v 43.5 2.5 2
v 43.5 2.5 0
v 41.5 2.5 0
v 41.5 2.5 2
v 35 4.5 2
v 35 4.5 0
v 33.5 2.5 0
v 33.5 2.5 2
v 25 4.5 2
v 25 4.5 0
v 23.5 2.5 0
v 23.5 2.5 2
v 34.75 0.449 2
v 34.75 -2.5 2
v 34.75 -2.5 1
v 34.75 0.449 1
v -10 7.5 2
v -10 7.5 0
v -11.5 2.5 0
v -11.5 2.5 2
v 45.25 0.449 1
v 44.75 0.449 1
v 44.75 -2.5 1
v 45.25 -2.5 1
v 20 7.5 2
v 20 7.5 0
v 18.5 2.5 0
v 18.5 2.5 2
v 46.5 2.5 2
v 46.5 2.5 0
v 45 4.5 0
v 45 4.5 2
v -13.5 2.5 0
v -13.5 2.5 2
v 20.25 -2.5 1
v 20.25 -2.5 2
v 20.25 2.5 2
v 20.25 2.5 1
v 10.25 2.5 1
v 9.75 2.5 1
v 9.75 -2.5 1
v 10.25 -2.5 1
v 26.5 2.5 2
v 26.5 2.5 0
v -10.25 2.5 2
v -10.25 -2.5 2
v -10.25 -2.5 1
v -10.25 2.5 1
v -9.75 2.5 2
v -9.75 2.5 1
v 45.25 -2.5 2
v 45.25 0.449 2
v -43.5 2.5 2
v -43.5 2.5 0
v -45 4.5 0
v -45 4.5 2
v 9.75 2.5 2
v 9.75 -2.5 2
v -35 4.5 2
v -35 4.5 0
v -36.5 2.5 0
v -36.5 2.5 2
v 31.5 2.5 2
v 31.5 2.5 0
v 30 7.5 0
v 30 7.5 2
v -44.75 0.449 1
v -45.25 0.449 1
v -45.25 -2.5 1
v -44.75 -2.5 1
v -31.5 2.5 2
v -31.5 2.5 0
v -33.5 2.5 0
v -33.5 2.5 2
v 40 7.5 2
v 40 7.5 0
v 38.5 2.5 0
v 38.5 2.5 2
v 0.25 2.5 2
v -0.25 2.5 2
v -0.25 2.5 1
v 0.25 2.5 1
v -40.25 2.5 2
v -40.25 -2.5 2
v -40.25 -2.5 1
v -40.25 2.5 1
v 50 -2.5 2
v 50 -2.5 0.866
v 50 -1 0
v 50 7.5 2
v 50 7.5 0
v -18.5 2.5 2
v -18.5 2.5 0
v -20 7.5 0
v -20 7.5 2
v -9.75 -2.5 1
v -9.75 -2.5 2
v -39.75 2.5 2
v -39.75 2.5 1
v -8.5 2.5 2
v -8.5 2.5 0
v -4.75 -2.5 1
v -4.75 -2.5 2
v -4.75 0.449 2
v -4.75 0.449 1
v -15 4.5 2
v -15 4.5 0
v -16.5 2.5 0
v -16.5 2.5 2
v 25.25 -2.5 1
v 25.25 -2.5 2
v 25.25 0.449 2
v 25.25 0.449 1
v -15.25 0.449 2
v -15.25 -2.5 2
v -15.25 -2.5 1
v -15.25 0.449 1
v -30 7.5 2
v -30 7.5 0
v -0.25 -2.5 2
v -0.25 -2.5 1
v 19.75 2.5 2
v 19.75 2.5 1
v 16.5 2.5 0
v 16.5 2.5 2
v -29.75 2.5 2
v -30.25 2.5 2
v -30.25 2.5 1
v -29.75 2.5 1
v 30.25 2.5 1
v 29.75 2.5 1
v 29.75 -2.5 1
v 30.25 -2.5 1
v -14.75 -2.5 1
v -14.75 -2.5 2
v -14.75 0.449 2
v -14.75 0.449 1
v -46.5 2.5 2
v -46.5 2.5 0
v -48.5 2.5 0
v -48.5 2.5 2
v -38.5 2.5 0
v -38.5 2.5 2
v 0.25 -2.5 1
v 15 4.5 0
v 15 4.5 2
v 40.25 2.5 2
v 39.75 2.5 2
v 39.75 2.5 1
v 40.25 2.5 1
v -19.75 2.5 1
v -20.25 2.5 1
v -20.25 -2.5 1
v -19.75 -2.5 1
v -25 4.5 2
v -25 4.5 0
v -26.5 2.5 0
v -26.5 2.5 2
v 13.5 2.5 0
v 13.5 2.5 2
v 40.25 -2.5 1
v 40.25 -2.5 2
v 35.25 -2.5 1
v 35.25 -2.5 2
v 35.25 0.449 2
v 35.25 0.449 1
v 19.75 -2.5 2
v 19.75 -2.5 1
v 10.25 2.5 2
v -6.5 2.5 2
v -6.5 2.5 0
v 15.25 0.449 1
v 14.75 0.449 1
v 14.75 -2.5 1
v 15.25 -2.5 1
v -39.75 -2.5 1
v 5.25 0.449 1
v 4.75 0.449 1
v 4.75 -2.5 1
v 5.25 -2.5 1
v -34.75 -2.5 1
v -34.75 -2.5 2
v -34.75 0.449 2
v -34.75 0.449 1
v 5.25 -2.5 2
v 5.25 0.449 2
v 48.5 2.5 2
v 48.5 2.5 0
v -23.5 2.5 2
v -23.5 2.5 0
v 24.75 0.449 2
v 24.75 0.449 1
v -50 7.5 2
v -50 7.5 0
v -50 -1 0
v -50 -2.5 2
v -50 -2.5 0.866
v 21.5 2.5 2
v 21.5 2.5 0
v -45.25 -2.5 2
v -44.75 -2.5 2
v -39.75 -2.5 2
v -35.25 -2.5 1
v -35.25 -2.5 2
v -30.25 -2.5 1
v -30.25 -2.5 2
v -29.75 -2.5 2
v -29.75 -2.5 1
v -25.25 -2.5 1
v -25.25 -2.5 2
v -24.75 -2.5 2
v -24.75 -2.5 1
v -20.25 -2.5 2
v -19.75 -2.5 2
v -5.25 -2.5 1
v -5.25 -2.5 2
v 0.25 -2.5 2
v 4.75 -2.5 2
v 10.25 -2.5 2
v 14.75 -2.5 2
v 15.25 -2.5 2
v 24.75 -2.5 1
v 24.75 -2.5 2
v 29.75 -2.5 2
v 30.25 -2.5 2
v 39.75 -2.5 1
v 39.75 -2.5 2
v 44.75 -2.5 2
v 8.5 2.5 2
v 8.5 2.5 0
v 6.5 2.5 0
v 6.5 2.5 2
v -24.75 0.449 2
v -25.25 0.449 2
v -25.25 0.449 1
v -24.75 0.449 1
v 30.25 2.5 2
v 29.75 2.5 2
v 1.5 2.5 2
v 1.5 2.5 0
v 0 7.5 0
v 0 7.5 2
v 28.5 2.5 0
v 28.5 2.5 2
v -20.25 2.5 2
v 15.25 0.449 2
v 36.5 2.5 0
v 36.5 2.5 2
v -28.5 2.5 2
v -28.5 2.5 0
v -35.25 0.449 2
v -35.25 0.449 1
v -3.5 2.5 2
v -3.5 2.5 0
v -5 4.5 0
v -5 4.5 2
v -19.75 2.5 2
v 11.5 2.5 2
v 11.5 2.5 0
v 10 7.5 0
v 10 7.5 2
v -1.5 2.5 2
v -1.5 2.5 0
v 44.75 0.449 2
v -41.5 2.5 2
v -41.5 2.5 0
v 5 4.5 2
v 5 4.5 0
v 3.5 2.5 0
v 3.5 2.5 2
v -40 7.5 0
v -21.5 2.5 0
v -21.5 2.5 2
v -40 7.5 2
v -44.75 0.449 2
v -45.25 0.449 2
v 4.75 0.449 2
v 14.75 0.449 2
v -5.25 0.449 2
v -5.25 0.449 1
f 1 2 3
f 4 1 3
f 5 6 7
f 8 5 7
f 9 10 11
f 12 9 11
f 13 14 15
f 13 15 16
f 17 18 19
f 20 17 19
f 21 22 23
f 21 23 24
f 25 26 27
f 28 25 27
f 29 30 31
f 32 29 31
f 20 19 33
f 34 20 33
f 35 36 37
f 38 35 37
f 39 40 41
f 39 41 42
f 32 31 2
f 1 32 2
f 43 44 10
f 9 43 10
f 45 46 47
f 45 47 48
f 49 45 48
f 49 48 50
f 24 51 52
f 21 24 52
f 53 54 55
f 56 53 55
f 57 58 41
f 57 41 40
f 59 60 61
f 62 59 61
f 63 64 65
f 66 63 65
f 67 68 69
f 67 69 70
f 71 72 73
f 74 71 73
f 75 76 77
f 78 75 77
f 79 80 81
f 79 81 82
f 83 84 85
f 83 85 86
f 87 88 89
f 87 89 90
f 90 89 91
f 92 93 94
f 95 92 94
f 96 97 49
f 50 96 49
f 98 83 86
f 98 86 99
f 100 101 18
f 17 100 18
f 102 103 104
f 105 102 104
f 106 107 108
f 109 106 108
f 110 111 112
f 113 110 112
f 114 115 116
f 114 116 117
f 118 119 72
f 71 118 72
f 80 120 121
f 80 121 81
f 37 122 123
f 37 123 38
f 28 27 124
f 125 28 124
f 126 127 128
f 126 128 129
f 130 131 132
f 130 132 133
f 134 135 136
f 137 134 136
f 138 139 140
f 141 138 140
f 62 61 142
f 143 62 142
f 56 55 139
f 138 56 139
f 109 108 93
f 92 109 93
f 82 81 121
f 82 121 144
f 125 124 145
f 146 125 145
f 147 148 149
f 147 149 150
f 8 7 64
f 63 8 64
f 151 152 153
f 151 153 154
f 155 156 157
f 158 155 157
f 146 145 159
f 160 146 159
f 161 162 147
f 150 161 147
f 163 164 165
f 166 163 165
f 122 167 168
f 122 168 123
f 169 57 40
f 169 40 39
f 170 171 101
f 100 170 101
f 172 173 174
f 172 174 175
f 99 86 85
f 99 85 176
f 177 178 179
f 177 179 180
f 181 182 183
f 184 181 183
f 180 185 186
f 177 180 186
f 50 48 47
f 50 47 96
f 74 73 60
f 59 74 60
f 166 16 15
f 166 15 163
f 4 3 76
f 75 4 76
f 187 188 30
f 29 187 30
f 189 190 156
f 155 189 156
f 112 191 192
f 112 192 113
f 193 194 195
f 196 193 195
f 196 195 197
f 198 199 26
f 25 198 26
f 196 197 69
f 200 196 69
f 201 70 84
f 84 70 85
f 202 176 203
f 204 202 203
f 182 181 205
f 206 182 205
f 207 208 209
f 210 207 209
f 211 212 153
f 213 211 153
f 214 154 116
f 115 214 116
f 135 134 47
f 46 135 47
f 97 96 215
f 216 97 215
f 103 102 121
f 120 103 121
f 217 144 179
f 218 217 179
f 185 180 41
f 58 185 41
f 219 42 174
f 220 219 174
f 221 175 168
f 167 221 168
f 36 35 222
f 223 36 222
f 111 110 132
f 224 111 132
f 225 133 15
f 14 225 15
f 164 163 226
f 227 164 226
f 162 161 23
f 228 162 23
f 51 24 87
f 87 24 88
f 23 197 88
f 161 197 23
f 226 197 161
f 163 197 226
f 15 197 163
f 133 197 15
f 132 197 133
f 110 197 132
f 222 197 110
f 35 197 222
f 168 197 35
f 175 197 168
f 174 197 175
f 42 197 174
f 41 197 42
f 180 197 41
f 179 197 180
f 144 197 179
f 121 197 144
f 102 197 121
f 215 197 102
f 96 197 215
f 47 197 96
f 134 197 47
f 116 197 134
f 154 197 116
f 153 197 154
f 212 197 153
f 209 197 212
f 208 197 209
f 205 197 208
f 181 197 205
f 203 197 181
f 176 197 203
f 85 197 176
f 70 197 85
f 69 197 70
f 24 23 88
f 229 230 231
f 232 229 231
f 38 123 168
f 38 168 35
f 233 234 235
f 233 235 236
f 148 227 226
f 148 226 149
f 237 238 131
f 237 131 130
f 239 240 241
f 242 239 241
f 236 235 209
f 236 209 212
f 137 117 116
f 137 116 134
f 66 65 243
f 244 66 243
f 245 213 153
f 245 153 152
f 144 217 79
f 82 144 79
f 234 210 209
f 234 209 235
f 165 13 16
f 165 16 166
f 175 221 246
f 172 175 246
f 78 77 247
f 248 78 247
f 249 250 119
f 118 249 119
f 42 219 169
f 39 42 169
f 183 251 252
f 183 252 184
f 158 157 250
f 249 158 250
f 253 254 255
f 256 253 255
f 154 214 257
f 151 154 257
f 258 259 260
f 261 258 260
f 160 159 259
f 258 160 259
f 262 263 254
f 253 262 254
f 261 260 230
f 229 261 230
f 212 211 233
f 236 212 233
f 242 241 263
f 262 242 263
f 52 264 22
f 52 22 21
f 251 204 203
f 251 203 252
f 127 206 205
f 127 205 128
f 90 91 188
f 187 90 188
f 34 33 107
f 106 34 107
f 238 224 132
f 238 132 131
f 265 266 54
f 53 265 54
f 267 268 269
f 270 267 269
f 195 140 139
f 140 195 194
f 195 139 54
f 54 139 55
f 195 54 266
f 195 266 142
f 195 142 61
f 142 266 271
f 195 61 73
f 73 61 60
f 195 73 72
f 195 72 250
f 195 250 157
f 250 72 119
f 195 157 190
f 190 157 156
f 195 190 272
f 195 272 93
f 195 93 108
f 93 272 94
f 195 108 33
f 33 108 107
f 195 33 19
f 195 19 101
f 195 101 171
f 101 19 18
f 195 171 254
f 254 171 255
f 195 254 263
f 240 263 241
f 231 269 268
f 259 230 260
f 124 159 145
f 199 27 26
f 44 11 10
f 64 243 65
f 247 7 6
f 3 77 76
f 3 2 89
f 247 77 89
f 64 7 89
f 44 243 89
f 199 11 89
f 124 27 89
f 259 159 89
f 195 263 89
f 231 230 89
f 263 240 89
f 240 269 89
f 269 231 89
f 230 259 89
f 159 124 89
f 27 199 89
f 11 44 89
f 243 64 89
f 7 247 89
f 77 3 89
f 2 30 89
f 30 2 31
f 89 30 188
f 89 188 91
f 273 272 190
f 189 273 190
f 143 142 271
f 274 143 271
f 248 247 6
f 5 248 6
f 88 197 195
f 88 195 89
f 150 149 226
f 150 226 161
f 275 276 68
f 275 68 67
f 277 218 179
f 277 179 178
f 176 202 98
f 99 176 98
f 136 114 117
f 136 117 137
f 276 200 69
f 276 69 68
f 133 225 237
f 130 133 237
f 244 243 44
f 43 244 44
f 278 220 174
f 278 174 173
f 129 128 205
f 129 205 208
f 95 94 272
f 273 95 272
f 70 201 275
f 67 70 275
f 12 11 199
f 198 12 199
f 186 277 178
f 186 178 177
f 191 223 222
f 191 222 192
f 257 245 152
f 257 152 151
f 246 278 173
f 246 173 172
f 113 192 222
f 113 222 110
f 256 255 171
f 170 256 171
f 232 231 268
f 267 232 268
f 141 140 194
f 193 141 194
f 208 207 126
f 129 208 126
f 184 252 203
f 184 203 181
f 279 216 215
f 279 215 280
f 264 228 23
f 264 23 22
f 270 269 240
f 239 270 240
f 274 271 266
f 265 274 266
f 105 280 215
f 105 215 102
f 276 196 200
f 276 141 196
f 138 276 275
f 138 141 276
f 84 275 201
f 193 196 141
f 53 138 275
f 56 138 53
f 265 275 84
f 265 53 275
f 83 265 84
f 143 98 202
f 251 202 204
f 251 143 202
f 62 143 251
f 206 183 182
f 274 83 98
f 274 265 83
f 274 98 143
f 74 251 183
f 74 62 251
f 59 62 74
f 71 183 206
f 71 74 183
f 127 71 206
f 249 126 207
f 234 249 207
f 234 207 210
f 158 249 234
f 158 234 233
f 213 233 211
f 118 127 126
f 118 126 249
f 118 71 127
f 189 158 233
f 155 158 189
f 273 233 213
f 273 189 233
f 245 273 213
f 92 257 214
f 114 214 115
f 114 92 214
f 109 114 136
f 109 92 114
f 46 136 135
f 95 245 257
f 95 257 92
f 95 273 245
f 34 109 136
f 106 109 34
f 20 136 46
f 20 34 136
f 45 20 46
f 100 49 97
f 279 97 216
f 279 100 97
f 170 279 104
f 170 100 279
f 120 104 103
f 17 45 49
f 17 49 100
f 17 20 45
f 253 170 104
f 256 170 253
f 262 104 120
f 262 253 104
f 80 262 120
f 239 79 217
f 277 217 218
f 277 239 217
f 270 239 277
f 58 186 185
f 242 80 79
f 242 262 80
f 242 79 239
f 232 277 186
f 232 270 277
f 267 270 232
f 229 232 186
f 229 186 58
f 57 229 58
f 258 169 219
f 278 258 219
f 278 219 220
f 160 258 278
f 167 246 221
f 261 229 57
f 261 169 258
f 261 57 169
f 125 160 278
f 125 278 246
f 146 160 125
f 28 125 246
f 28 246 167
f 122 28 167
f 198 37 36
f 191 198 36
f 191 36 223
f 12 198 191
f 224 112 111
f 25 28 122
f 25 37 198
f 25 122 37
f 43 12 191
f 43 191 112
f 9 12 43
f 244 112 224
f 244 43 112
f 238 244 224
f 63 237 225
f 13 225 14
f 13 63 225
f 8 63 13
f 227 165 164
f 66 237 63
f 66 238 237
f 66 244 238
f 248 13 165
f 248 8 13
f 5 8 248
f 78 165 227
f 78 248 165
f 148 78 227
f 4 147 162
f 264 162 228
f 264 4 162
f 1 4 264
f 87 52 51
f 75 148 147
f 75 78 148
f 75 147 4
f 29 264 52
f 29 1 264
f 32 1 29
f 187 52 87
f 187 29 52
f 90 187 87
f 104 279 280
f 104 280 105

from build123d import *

# Parameters (mm, degrees)
F1_DEPTH = 2
F2_SIZE2 = 0.8660254038
F2_SIZE  = 1.5
F3_W     = 0.5
F3_H     = 5
F3_H_2   = 2.9487536475
F4_DEPTH = 1


with BuildPart() as f1:
    # F0 (on Top) → F1 (new body)
    with BuildSketch(Plane.XY):
        Polygon((-50, -2.5), (50, -2.5), (50, 2.5), (48.5, 2.5), (46.5, 2.5), (43.5, 2.5), (41.5, 2.5), (38.5, 2.5), (36.5, 2.5), (33.5, 2.5), (31.5, 2.5), (28.5, 2.5), (26.5, 2.5), (23.5, 2.5), (21.5, 2.5), (18.5, 2.5), (16.5, 2.5), (13.5, 2.5), (11.5, 2.5), (8.5, 2.5), (6.5, 2.5), (3.5, 2.5), (1.5, 2.5), (-1.5, 2.5), (-3.5, 2.5), (-6.5, 2.5), (-8.5, 2.5), (-11.5, 2.5), (-13.5, 2.5), (-16.5, 2.5), (-18.5, 2.5), (-21.5, 2.5), (-23.5, 2.5), (-26.5, 2.5), (-28.5, 2.5), (-31.5, 2.5), (-33.5, 2.5), (-36.5, 2.5), (-38.5, 2.5), (-40, 2.5), (-41.5, 2.5), (-43.5, 2.5), (-46.5, 2.5), (-48.5, 2.5), (-50, 2.5), align=None)
        Polygon((48.5, 2.5), (50, 2.5), (50, 7.5), align=None)
        Polygon((-50, 7.5), (-50, 2.5), (-48.5, 2.5), align=None)
        Polygon((43.5, 2.5), (46.5, 2.5), (45, 4.5), align=None)
        Polygon((-45, 4.5), (-46.5, 2.5), (-43.5, 2.5), align=None)
        Polygon((38.5, 2.5), (41.5, 2.5), (40, 7.5), align=None)
        Polygon((-40, 7.5), (-41.5, 2.5), (-40, 2.5), (-38.5, 2.5), align=None)
        Polygon((33.5, 2.5), (36.5, 2.5), (35, 4.5), align=None)
        Polygon((-35, 4.5), (-36.5, 2.5), (-33.5, 2.5), align=None)
        Polygon((28.5, 2.5), (31.5, 2.5), (30, 7.5), align=None)
        Polygon((-30, 7.5), (-31.5, 2.5), (-28.5, 2.5), align=None)
        Polygon((23.5, 2.5), (26.5, 2.5), (25, 4.5), align=None)
        Polygon((-25, 4.5), (-26.5, 2.5), (-23.5, 2.5), align=None)
        Polygon((18.5, 2.5), (21.5, 2.5), (20, 7.5), align=None)
        Polygon((-20, 7.5), (-21.5, 2.5), (-18.5, 2.5), align=None)
        Polygon((13.5, 2.5), (16.5, 2.5), (15, 4.5), align=None)
        Polygon((-15, 4.5), (-16.5, 2.5), (-13.5, 2.5), align=None)
        Polygon((8.5, 2.5), (11.5, 2.5), (10, 7.5), align=None)
        Polygon((-10, 7.5), (-11.5, 2.5), (-8.5, 2.5), align=None)
        Polygon((3.5, 2.5), (6.5, 2.5), (5, 4.5), align=None)
        Polygon((-5, 4.5), (-6.5, 2.5), (-3.5, 2.5), align=None)
        Polygon((-1.5, 2.5), (1.5, 2.5), (0, 7.5), align=None)
    extrude(amount=F1_DEPTH)

    # F2
    f2_edges = [f1.edges().sort_by_distance(p)[0] for p in [
        (0, -2.5, 0),
    ]]
    f2_side = f1.faces().sort_by_distance((0, 0.673554, 0))[0]
    chamfer(f2_edges, length=F2_SIZE, length2=F2_SIZE2, reference=f2_side)

    # F3 (on face) → F4 (cut)
    with BuildSketch(Plane.XY.offset(2)):
        with Locations((-40, 0)):
            Rectangle(F3_W, F3_H)
        with Locations((-30, 0)):
            Rectangle(F3_W, F3_H)
        with Locations((-20, 0)):
            Rectangle(F3_W, F3_H)
        with Locations((-10, 0)):
            Rectangle(F3_W, F3_H)
        Rectangle(F3_W, F3_H)
        with Locations((10, 0)):
            Rectangle(F3_W, F3_H)
        with Locations((20, 0)):
            Rectangle(F3_W, F3_H)
        with Locations((30, 0)):
            Rectangle(F3_W, F3_H)
        with Locations((40, 0)):
            Rectangle(F3_W, F3_H)
        with Locations((-45, -1.0256231762)):
            Rectangle(F3_W, F3_H_2)
        with Locations((-35, -1.0256231762)):
            Rectangle(F3_W, F3_H_2)
        with Locations((-25, -1.0256231762)):
            Rectangle(F3_W, F3_H_2)
        with Locations((-15, -1.0256231762)):
            Rectangle(F3_W, F3_H_2)
        with Locations((-5, -1.0256231762)):
            Rectangle(F3_W, F3_H_2)
        with Locations((5, -1.0256231762)):
            Rectangle(F3_W, F3_H_2)
        with Locations((15, -1.0256231762)):
            Rectangle(F3_W, F3_H_2)
        with Locations((25, -1.0256231762)):
            Rectangle(F3_W, F3_H_2)
        with Locations((35, -1.0256231762)):
            Rectangle(F3_W, F3_H_2)
        with Locations((45, -1.0256231762)):
            Rectangle(F3_W, F3_H_2)
    extrude(amount=-F4_DEPTH, mode=Mode.SUBTRACT)


solid = f1.part
